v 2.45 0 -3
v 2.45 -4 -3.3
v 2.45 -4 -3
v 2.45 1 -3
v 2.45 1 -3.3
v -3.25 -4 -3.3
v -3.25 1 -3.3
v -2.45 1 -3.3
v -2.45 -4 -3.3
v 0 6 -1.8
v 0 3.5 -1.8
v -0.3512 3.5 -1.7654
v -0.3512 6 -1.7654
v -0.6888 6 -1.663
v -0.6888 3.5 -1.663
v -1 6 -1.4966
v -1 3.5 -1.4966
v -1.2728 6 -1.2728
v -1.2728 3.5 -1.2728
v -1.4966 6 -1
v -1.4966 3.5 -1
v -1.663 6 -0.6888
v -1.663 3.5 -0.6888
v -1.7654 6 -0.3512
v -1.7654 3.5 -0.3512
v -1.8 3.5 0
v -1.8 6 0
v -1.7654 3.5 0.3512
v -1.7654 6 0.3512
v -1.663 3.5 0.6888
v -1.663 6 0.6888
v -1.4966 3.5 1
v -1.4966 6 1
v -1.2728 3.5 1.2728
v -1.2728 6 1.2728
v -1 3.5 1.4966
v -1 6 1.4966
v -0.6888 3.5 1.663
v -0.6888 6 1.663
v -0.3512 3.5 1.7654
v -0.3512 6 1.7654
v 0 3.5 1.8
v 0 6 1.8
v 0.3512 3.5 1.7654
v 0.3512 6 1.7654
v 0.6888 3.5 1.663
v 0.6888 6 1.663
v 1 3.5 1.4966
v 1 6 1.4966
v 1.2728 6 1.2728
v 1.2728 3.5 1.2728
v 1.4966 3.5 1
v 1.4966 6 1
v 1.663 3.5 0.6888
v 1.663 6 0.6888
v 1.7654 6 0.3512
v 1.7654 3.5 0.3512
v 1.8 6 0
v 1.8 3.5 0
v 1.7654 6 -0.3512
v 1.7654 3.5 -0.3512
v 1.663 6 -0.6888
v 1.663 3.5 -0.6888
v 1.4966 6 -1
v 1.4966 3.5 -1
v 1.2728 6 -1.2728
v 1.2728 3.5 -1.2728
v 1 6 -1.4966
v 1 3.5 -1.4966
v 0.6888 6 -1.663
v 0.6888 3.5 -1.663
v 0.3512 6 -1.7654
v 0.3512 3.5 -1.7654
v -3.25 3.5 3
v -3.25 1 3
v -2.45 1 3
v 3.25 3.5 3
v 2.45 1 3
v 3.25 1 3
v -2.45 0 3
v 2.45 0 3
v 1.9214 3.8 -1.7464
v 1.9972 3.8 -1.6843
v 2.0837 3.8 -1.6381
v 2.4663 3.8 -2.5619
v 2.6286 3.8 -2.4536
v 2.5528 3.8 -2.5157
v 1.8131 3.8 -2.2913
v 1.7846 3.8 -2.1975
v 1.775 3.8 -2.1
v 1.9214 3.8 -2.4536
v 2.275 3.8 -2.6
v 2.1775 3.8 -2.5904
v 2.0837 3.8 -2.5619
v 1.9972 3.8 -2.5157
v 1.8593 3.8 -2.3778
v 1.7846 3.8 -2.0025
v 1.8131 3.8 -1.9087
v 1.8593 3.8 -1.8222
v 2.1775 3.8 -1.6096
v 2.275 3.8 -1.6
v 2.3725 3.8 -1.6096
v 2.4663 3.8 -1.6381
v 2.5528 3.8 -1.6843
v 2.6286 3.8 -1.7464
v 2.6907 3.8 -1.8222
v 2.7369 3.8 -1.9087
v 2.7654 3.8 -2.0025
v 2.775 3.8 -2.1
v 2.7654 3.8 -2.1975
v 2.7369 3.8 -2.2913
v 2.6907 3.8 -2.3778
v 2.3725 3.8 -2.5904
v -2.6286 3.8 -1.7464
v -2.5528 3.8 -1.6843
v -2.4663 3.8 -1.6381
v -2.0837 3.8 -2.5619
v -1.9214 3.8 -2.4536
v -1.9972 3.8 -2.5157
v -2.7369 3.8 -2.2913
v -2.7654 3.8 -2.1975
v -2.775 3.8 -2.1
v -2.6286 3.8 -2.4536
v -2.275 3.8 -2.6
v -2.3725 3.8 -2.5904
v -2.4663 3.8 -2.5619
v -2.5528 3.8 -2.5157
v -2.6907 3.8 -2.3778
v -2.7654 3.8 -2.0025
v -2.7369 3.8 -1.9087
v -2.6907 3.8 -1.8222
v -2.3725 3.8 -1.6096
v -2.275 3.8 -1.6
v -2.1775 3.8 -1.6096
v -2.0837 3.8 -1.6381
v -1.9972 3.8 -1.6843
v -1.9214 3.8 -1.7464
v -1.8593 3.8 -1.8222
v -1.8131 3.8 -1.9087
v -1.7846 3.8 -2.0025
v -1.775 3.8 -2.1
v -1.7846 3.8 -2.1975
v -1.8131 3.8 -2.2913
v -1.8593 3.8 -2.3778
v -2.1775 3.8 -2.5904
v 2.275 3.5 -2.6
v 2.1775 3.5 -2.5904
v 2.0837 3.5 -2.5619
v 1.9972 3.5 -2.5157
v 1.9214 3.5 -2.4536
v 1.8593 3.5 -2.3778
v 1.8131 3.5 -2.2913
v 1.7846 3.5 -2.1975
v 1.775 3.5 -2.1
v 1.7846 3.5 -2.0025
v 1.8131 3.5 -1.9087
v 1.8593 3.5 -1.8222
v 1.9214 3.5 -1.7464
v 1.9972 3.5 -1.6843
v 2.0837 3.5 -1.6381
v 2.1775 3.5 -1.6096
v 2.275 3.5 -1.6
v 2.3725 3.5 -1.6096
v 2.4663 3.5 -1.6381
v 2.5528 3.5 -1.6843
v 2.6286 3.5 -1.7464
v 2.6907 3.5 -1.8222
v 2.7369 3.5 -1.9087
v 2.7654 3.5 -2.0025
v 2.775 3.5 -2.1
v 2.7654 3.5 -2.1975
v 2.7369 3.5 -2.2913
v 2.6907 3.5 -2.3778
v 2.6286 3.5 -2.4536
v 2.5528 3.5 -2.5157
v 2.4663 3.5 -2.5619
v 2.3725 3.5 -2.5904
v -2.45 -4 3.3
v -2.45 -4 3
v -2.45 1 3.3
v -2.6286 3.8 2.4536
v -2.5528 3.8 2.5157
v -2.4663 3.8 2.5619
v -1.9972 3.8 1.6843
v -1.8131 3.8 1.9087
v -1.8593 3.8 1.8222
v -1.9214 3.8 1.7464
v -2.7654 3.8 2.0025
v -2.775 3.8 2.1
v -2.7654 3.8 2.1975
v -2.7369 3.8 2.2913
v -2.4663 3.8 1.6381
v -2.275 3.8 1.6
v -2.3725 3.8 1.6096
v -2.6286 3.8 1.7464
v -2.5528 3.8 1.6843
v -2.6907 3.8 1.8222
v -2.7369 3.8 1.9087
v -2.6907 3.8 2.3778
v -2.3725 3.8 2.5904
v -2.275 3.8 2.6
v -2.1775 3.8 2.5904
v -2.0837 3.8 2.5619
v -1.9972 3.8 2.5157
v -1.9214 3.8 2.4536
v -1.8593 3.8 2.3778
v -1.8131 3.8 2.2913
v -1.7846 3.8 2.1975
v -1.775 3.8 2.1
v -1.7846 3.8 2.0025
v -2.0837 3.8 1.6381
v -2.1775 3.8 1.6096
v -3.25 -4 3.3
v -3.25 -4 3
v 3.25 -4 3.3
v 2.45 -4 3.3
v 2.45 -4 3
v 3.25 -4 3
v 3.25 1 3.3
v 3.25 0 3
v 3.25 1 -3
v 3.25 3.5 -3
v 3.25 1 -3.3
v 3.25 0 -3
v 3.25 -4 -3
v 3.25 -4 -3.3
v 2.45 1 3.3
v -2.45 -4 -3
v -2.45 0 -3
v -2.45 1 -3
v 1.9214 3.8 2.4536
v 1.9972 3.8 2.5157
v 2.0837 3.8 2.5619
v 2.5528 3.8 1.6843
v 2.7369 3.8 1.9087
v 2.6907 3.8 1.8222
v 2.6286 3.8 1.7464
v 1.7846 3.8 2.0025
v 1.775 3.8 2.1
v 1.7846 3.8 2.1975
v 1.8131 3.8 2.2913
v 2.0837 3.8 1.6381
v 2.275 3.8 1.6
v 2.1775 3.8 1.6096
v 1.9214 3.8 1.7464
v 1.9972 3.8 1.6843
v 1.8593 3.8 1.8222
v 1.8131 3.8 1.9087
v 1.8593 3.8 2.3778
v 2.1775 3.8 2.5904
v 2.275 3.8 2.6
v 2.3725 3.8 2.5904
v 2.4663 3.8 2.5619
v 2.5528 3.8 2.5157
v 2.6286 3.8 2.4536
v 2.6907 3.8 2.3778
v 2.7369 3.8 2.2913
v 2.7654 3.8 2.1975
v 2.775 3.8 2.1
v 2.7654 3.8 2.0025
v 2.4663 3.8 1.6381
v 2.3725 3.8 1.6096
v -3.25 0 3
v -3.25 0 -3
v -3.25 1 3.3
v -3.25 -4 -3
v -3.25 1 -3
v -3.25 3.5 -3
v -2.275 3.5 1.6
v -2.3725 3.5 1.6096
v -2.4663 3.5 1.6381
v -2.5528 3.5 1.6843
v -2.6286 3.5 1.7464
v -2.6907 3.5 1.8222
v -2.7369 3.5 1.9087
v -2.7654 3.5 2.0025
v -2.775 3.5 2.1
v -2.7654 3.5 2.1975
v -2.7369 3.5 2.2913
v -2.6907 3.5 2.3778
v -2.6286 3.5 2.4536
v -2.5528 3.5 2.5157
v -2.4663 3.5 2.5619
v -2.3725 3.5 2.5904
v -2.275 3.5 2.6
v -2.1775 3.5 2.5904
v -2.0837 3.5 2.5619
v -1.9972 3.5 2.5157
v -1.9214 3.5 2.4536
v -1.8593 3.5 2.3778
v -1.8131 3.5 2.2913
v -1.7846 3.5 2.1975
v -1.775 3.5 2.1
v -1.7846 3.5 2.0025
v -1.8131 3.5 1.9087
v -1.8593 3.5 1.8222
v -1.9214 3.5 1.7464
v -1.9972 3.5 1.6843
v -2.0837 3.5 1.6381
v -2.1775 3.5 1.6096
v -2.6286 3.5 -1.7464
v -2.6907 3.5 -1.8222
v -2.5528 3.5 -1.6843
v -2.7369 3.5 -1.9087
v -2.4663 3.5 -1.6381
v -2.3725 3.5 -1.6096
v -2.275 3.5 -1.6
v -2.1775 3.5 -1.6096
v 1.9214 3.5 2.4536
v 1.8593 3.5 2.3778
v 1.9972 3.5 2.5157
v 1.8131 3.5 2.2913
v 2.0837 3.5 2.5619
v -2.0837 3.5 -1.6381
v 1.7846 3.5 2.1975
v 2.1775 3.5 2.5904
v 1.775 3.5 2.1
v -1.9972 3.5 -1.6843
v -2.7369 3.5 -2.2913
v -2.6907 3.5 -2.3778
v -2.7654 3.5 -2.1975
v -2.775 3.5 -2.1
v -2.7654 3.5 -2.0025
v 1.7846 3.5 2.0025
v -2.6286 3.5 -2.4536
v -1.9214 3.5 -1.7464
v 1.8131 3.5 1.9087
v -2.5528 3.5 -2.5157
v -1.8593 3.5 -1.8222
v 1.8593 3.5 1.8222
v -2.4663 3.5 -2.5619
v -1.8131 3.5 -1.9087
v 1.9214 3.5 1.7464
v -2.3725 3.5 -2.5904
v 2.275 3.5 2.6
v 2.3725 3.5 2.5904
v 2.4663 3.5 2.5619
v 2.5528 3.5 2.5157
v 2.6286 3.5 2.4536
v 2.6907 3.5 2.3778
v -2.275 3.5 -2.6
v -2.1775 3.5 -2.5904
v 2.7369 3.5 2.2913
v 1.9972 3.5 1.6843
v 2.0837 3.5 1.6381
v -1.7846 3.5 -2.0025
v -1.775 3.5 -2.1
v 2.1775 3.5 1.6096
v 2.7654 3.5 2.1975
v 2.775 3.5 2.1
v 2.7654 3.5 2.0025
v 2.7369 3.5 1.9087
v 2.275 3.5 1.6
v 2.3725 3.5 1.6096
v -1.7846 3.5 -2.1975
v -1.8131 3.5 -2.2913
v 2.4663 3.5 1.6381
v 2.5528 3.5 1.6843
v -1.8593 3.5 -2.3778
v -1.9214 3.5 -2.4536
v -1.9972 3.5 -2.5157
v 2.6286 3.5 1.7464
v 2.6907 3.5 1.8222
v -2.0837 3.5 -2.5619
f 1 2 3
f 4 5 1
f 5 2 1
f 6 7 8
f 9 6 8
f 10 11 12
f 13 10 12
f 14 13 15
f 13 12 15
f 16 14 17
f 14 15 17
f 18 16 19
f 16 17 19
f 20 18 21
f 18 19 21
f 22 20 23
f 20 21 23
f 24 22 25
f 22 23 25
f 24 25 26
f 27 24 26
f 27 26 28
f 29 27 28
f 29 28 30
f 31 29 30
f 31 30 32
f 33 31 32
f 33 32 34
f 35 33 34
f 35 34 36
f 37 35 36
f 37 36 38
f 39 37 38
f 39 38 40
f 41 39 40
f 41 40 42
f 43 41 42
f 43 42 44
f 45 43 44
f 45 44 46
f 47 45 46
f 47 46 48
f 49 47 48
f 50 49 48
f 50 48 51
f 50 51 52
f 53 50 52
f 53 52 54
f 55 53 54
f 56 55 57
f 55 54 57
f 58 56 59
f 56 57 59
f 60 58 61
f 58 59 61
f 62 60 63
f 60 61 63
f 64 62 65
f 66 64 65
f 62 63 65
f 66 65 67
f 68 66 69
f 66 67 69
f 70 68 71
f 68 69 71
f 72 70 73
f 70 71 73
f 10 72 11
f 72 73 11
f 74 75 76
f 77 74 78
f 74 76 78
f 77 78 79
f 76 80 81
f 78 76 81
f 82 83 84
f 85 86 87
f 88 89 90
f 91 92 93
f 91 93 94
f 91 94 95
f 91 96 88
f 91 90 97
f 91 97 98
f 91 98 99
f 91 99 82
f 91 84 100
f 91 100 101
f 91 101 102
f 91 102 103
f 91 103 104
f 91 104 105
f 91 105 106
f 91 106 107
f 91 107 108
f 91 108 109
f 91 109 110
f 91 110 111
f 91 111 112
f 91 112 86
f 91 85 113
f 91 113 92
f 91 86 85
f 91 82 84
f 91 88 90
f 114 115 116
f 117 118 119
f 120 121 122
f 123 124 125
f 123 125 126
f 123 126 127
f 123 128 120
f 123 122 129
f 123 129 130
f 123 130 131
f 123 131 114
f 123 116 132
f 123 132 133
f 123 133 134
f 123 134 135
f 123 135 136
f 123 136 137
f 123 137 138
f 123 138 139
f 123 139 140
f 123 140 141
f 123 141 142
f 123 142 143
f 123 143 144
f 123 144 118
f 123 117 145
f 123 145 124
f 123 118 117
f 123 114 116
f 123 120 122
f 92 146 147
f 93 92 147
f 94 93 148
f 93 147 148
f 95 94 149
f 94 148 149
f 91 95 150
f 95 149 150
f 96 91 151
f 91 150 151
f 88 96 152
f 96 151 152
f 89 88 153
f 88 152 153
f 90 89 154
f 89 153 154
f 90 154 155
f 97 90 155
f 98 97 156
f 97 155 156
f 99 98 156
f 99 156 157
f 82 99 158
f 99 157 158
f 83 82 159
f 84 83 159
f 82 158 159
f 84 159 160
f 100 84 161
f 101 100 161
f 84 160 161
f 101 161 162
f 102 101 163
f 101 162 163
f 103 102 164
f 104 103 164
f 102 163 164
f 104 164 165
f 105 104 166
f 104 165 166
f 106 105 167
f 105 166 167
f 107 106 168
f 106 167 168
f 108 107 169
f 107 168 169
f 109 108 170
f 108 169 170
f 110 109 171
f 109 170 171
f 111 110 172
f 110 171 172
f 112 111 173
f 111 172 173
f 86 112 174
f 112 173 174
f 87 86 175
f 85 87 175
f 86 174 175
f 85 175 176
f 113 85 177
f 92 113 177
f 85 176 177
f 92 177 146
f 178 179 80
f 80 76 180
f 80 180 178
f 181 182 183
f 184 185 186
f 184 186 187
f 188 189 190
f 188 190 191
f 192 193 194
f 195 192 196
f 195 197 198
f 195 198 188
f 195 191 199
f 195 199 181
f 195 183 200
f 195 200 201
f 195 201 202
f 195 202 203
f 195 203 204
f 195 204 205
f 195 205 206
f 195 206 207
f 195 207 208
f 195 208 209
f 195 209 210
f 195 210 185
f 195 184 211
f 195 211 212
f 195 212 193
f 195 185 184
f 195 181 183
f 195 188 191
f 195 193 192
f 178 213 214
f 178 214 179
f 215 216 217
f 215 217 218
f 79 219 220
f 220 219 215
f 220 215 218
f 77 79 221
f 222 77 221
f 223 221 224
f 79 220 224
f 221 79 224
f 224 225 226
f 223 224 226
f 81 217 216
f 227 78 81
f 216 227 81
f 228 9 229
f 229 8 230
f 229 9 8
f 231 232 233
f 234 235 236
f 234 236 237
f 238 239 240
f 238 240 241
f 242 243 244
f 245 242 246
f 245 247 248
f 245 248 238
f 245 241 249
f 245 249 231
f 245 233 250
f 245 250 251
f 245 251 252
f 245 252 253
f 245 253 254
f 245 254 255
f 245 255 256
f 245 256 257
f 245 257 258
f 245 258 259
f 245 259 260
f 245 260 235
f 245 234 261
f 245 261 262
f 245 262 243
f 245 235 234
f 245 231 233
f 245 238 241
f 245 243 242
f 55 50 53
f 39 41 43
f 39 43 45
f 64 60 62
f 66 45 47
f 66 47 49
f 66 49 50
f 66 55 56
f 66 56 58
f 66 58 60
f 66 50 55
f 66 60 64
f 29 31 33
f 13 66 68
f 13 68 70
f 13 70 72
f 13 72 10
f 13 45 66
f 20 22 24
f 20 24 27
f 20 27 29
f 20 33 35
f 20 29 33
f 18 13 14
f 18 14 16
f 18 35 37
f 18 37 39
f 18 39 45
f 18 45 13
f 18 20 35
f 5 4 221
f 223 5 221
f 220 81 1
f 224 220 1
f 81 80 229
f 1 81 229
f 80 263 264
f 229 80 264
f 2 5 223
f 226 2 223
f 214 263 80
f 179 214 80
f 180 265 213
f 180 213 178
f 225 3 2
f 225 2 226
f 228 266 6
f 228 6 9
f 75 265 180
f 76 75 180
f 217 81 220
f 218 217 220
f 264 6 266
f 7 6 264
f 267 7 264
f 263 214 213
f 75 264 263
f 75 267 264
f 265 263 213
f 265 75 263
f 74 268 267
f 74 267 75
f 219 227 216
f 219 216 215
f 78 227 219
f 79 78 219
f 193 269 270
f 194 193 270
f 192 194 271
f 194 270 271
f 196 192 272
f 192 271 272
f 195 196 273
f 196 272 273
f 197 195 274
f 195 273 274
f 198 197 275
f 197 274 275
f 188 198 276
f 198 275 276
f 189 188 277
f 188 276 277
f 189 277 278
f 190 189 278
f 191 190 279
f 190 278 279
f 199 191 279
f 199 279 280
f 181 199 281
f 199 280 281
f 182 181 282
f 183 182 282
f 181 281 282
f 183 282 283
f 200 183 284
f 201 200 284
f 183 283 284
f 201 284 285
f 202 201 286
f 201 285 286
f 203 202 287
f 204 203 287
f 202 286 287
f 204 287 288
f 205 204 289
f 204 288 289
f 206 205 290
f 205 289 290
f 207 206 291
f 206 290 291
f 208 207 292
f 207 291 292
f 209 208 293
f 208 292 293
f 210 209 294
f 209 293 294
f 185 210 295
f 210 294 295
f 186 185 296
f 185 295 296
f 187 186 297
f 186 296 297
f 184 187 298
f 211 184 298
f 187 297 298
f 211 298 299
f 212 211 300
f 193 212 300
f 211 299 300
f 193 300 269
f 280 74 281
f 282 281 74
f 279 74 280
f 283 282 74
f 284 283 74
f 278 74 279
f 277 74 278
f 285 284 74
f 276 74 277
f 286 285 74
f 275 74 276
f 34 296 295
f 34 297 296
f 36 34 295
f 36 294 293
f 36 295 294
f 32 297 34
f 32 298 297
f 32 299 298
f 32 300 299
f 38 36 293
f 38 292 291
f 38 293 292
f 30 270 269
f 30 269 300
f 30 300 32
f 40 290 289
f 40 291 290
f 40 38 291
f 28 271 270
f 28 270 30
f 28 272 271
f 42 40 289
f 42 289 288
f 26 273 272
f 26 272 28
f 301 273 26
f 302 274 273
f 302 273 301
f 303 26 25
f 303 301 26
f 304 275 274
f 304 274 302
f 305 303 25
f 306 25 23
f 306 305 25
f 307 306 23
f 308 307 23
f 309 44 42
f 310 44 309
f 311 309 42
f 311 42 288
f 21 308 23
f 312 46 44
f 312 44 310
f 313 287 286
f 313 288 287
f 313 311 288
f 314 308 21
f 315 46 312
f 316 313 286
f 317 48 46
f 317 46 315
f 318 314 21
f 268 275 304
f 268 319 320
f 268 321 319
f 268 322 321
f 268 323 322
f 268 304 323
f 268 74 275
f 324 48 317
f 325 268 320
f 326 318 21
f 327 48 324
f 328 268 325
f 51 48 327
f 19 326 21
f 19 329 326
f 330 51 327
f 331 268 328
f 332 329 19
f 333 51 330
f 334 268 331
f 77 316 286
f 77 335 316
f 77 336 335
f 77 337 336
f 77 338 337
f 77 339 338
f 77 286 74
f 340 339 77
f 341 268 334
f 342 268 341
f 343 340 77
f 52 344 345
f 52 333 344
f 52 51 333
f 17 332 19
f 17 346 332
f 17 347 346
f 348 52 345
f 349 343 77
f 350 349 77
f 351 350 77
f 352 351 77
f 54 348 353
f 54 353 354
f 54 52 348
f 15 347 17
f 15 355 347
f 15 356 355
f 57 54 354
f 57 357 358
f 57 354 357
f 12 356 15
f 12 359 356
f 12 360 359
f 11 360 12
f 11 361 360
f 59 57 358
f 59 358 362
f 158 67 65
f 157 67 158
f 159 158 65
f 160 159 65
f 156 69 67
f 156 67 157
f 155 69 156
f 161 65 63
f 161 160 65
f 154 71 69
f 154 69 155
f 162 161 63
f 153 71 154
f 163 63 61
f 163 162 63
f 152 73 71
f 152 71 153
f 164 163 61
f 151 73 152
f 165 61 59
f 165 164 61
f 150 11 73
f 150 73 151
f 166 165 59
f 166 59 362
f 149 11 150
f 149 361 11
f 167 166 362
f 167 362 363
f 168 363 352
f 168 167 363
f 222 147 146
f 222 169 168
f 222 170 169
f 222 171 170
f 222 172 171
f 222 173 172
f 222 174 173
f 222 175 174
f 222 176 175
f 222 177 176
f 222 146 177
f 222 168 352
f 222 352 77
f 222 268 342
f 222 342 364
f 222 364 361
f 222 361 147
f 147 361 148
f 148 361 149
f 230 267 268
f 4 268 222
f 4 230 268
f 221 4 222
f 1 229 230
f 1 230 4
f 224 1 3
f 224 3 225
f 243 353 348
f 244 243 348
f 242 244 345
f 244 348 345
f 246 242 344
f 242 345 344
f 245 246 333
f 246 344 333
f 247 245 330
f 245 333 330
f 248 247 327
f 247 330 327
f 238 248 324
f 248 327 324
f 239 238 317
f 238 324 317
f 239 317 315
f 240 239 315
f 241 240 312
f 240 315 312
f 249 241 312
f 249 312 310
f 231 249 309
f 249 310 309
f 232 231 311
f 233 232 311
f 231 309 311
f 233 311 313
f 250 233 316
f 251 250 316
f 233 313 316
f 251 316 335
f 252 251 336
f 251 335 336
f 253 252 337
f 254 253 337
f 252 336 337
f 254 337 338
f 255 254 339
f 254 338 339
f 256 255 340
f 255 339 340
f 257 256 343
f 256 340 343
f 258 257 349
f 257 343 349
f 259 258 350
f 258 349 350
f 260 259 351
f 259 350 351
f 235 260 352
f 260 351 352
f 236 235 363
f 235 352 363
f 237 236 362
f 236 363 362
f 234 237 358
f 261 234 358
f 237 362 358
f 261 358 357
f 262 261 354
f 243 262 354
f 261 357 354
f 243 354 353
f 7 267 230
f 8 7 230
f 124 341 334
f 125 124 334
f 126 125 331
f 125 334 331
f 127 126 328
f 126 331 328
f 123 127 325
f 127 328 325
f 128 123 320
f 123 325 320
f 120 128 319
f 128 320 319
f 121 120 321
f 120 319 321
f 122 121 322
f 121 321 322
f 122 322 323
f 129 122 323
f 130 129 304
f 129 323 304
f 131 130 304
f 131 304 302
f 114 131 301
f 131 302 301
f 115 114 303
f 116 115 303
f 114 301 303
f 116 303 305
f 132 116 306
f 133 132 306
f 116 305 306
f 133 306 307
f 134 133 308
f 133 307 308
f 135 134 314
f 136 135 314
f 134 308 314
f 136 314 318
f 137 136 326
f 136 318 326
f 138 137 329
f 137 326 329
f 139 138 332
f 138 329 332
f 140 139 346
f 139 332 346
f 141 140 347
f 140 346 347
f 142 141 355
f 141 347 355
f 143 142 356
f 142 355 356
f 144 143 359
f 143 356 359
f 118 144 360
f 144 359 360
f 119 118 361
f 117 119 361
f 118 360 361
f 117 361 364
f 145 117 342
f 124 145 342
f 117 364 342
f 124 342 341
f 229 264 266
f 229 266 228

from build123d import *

# Parameters (mm, degrees)
SKETCH_1_W      = 6.5
SKETCH_1_H      = 6
EXTRUDE_1_DEPTH = 3.5
SKETCH_1_3_R    = 1.8
EXTRUDE_2_DEPTH = 6
EXTRUDE_START   = 3.5
SKETCH_1_4_R    = 0.5
EXTRUDE_3_DEPTH = 0.3
EXTRUDE_START_2 = -1
SKETCH_2_W      = 0.8
SKETCH_2_H      = 0.3
EXTRUDE_4_DEPTH = 5


with BuildPart() as part:
    # 草图1 → 凸台-拉伸1 (new body)
    with BuildSketch(Plane(origin=(0, 0, 0), x_dir=(1, 0, 0), z_dir=(0, 1, 0))):
        Rectangle(SKETCH_1_W, SKETCH_1_H)
    extrude(amount=EXTRUDE_1_DEPTH)

    # 草图1<3> → 凸台-拉伸2 (add)
    with BuildSketch(Plane(origin=(0, 0, 0), x_dir=(1, 0, 0), z_dir=(0, 1, 0))):
        with Locations(Location((0, 0, 0), (0, 0, 90))):
            Circle(SKETCH_1_3_R)
    extrude(amount=EXTRUDE_2_DEPTH)

    # 草图1<4> → 凸台-拉伸3 (add)
    with BuildSketch(Plane(origin=(0, 0, 0), x_dir=(1, 0, 0), z_dir=(0, 1, 0)).offset(EXTRUDE_START)):
        with Locations(Location((-2.275, 2.1, 0), (0, 0, 90))):
            Circle(SKETCH_1_4_R)
        with Locations(Location((-2.275, -2.1, 0), (0, 0, 90))):
            Circle(SKETCH_1_4_R)
        with Locations(Location((2.275, -2.1, 0), (0, 0, 90))):
            Circle(SKETCH_1_4_R)
        with Locations(Location((2.275, 2.1, 0), (0, 0, 90))):
            Circle(SKETCH_1_4_R)
    extrude(amount=EXTRUDE_3_DEPTH)

    # 草图2 → 凸台-拉伸4 (add)
    with BuildSketch(Plane.XZ.offset(EXTRUDE_START_2)):
        with Locations((-2.85, 3.15)):
            Rectangle(SKETCH_2_W, SKETCH_2_H)
        with Locations((2.85, 3.15)):
            Rectangle(SKETCH_2_W, SKETCH_2_H)
        with Locations((-2.85, -3.15)):
            Rectangle(SKETCH_2_W, SKETCH_2_H)
        with Locations((2.85, -3.15)):
            Rectangle(SKETCH_2_W, SKETCH_2_H)
    extrude(amount=EXTRUDE_4_DEPTH)


solid = part.part
